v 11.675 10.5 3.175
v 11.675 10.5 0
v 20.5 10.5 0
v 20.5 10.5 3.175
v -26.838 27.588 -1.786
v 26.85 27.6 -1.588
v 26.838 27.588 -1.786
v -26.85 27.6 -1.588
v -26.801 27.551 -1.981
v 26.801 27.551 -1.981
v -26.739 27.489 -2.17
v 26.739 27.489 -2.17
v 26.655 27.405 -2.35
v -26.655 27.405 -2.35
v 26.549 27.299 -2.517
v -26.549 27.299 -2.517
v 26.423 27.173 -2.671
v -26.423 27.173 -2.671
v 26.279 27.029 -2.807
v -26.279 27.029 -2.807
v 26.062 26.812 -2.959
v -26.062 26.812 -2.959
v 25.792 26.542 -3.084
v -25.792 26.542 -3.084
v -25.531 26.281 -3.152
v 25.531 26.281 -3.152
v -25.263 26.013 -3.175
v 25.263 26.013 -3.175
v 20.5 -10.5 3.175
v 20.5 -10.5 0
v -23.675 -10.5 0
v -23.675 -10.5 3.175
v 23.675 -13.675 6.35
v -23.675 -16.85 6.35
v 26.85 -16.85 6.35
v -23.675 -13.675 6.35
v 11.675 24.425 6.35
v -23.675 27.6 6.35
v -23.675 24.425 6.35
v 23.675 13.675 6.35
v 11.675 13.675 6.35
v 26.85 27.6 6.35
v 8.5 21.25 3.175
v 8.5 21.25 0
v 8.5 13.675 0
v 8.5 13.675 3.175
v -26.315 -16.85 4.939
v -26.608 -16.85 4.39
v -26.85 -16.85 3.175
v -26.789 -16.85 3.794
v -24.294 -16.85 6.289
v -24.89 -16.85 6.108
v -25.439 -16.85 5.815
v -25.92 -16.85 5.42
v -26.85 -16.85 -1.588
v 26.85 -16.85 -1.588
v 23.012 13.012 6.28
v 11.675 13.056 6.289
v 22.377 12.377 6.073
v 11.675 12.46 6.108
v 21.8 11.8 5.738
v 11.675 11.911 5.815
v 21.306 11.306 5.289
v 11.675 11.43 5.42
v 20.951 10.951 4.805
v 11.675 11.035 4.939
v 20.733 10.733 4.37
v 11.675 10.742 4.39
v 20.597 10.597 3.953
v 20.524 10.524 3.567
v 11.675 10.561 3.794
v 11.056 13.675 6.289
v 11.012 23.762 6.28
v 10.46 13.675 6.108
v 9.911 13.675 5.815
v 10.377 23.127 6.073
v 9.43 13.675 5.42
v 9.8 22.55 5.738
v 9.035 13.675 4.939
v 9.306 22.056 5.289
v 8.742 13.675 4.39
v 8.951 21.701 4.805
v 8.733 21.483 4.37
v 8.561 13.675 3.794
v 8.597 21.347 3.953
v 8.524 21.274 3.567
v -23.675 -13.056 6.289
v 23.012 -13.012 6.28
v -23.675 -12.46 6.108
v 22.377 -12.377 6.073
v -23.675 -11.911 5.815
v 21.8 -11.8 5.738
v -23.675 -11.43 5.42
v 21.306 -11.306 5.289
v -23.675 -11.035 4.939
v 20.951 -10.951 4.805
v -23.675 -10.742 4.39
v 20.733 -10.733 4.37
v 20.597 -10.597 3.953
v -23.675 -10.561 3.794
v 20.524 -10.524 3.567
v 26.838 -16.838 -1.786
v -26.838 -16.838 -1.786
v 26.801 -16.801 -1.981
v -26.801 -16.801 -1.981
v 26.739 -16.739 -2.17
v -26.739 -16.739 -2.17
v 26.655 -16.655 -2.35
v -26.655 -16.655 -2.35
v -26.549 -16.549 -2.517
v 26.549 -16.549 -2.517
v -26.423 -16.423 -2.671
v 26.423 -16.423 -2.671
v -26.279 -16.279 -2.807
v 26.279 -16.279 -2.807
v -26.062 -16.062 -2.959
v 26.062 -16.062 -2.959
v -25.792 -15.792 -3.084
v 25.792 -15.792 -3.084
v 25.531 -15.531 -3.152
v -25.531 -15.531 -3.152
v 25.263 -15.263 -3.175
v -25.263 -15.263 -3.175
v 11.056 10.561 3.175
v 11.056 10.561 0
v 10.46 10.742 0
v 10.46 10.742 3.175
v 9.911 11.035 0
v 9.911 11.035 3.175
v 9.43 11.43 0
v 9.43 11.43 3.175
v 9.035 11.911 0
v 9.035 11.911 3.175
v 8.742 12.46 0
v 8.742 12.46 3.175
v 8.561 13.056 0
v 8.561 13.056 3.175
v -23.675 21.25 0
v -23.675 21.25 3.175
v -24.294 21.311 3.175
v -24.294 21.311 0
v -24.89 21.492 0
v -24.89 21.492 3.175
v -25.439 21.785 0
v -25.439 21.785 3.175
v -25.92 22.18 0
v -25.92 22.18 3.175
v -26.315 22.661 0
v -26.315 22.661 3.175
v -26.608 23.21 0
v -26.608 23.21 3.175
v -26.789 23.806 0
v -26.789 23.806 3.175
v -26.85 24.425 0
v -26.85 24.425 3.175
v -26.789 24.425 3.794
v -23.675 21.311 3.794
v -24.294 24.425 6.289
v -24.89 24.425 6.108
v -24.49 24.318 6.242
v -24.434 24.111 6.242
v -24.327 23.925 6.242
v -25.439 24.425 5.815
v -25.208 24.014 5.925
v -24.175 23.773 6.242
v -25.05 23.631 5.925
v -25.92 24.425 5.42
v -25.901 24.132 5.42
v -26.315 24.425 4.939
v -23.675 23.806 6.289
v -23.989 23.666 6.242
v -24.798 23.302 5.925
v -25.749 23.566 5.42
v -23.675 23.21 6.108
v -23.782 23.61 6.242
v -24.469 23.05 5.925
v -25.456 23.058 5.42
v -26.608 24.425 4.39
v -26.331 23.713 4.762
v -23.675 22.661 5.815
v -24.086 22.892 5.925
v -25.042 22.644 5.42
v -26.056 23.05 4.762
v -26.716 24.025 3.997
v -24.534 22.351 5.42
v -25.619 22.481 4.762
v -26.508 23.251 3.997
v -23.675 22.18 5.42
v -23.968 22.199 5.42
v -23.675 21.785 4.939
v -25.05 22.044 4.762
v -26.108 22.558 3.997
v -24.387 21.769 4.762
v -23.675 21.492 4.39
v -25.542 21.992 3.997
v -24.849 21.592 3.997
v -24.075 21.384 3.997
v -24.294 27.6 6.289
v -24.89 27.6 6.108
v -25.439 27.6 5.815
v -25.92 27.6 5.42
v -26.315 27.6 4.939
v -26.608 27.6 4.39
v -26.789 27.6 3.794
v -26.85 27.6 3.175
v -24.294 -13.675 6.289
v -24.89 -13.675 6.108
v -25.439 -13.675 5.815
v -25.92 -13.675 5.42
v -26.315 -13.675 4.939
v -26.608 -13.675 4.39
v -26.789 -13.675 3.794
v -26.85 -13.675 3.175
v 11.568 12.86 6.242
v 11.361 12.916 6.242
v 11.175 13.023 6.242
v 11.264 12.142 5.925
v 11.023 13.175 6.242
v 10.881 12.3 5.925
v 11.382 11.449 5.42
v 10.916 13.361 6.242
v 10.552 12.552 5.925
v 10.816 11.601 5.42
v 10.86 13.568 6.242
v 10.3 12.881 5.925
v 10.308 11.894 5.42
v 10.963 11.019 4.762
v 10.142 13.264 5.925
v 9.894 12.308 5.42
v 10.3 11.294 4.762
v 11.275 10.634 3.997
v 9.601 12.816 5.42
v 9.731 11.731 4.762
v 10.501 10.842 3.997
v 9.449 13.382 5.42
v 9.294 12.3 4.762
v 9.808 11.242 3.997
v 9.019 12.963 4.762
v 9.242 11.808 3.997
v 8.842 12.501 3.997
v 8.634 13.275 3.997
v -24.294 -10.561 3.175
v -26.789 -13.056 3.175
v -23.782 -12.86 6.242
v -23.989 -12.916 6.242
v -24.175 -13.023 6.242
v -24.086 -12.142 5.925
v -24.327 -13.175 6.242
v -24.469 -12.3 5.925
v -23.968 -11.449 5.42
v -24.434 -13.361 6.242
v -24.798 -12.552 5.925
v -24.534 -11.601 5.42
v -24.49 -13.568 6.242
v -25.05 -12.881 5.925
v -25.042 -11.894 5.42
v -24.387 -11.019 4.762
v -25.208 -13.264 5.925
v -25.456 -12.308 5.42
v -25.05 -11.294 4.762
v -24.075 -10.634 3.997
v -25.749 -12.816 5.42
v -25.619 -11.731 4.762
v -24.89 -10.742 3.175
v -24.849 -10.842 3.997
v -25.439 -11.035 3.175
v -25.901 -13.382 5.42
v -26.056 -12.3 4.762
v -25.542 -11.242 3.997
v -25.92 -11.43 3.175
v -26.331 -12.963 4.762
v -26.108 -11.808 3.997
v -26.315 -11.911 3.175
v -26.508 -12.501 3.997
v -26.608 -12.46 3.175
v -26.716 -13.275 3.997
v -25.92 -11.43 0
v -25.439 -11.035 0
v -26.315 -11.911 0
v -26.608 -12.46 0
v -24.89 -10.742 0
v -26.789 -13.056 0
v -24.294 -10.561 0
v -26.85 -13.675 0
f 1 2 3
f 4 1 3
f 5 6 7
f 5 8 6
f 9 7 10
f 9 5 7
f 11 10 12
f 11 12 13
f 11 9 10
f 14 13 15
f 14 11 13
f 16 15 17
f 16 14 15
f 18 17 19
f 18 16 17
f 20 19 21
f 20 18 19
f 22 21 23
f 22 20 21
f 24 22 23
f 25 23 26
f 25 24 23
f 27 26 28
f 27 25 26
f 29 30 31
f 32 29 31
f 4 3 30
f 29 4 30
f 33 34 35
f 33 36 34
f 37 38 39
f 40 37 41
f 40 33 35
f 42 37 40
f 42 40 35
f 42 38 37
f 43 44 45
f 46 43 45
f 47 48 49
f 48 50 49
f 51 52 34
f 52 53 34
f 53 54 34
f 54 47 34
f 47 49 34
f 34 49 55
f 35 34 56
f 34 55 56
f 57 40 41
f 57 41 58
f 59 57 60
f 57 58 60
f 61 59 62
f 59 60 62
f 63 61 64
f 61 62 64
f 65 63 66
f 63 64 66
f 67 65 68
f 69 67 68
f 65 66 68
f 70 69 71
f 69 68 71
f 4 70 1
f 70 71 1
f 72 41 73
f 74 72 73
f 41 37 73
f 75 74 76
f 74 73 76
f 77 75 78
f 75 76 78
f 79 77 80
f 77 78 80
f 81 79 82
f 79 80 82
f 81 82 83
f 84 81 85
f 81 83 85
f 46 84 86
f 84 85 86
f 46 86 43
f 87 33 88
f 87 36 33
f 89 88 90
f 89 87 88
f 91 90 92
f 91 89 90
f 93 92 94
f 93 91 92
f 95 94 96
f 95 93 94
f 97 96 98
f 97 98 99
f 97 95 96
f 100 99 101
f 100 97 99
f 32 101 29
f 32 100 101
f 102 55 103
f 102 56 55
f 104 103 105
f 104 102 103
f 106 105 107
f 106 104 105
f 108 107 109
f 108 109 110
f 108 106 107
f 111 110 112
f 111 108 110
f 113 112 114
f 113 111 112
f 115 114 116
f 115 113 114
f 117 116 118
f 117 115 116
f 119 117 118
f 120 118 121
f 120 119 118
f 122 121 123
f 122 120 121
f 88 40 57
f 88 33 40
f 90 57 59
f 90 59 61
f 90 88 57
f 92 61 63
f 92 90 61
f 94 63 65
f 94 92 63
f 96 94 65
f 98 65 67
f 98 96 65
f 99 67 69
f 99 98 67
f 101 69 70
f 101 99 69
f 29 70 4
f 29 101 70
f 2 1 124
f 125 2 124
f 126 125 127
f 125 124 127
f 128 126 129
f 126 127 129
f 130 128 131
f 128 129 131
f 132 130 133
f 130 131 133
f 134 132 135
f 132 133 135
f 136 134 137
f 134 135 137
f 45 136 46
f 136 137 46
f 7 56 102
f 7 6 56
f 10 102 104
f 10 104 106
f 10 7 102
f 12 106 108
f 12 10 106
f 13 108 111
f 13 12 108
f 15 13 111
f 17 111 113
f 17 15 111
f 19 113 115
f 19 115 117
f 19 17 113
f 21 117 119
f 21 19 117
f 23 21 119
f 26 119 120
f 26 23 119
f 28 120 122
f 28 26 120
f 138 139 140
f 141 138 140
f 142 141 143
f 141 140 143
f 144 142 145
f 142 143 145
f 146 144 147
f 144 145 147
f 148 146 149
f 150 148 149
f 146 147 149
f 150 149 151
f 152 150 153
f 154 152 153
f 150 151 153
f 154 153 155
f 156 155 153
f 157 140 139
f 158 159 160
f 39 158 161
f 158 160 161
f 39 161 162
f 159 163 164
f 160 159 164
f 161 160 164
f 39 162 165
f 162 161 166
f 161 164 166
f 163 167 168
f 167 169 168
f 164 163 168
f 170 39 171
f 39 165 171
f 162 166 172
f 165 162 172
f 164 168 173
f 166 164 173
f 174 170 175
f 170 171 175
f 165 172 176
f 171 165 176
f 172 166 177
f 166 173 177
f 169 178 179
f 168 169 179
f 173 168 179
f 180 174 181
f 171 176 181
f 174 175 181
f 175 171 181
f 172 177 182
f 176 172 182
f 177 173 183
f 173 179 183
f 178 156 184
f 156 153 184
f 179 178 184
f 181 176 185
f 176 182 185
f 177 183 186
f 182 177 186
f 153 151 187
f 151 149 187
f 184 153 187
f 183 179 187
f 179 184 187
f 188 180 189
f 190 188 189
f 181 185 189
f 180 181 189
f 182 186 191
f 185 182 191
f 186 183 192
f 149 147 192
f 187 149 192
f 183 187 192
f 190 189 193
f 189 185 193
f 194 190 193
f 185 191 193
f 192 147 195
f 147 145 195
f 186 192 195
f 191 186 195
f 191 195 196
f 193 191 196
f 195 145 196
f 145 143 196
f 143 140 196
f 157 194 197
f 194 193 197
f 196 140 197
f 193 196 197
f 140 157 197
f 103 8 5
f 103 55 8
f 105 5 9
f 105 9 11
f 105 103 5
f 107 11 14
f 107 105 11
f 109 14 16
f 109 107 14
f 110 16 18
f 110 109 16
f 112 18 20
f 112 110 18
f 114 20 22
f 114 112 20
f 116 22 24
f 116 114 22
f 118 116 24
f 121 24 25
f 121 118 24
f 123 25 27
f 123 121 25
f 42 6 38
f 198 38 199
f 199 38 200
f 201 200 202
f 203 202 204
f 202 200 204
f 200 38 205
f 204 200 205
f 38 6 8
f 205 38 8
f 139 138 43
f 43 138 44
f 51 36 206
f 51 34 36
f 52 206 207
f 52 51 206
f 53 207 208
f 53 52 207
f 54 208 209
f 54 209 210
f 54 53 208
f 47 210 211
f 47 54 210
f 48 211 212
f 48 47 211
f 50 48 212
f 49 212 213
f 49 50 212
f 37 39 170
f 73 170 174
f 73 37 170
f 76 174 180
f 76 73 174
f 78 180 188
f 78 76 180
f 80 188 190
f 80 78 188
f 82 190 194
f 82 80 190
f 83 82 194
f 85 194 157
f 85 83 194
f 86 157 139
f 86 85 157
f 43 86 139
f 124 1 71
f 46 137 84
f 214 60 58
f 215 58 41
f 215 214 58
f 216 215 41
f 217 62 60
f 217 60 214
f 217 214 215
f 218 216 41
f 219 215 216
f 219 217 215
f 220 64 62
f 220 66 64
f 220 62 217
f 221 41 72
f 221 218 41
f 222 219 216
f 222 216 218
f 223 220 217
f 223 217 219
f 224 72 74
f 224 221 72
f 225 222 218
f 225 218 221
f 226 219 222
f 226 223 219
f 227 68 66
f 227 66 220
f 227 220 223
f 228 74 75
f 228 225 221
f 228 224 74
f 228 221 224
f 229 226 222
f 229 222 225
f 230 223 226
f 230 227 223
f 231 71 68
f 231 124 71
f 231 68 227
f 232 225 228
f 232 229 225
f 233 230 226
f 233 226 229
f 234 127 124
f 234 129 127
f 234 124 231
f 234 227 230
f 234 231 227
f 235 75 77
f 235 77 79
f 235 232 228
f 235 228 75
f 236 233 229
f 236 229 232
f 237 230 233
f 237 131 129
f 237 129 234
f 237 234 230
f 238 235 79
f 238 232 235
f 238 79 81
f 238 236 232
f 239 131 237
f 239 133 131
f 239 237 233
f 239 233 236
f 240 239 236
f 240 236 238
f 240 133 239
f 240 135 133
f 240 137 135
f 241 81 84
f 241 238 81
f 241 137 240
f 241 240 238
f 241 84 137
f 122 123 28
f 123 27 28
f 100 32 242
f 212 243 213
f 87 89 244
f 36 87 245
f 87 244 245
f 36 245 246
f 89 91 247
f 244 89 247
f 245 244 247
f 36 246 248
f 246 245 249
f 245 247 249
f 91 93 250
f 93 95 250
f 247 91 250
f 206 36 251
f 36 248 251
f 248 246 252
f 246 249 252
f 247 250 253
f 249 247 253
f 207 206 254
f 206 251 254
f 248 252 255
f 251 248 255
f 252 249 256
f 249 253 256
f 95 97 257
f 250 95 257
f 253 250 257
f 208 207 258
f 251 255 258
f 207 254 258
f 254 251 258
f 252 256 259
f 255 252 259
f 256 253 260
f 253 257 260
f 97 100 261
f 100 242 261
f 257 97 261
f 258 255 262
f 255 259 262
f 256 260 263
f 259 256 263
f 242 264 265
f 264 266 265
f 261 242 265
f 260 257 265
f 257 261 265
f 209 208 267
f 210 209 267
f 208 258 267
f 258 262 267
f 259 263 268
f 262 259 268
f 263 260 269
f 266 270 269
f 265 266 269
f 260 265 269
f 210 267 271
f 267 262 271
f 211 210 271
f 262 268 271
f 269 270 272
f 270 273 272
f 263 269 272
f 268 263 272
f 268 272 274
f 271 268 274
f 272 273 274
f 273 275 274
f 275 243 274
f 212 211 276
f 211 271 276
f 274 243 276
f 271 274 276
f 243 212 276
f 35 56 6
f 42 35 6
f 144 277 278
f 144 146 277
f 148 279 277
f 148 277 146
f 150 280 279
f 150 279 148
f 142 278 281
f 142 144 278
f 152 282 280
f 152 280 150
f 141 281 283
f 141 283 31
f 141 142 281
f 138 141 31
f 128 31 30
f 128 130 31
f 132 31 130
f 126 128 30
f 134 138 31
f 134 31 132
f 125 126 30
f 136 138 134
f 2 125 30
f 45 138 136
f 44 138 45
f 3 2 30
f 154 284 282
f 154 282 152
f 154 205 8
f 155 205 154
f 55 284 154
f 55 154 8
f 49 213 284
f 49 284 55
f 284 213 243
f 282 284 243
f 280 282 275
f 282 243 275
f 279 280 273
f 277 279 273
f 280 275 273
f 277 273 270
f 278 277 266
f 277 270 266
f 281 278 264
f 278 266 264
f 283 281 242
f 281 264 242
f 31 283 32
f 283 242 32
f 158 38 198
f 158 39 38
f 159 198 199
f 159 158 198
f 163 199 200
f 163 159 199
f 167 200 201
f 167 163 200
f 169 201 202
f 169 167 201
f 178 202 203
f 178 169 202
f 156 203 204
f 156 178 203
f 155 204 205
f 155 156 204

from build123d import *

# Parameters (mm, degrees)
F1_DEPTH = 3.175
F2_DEPTH = 6.35
F3_R     = 3.175
F4_R     = 3.175
F5_R     = 1.5875


with BuildPart() as f1:
    # F0 (on Top) → F1 (new body)
    with BuildSketch(Plane.XY):
        Polygon((8.5, 10.5), (20.5, 10.5), (20.5, -10.5), (-20.5, -10.5), (-26.85, -10.5), (-26.85, -16.85), (26.85, -16.85), (26.85, 27.6), (-26.85, 27.6), (-26.85, 21.25), (-20.5, 21.25), (8.5, 21.25), align=None)
        Polygon((20.5, -10.5), (20.5, 10.5), (8.5, 10.5), (8.5, 21.25), (-20.5, 21.25), (-20.5, 10.5), (-20.5, -10.5), align=None)
        Polygon((-26.85, -10.5), (-20.5, -10.5), (-20.5, 10.5), (-20.5, 21.25), (-26.85, 21.25), align=None)
    extrude(amount=-F1_DEPTH)

    # F0 (on Top) → F2 (join)
    with BuildSketch(Plane.XY):
        Polygon((8.5, 10.5), (20.5, 10.5), (20.5, -10.5), (-20.5, -10.5), (-26.85, -10.5), (-26.85, -16.85), (26.85, -16.85), (26.85, 27.6), (-26.85, 27.6), (-26.85, 21.25), (-20.5, 21.25), (8.5, 21.25), align=None)
    extrude(amount=F2_DEPTH)

    # F3
    f3_edges = [f1.edges().sort_by_distance(p)[0] for p in [
        (8.5, 10.5, 3.175),
        (-26.85, -10.5, 3.175),
        (-26.85, 21.25, 3.175),
    ]]
    fillet(f3_edges, radius=F3_R)

    # F4
    f4_edges = [f1.edges().sort_by_distance(p)[0] for p in [
        (9.429936, 11.429936, 6.35),
        (20.5, 0, 6.35),
        (-1.5875, -10.5, 6.35),
        (-7.5875, 21.25, 6.35),
    ]]
    fillet(f4_edges, radius=F4_R)

    # F5
    f5_edges = [f1.edges().sort_by_distance(p)[0] for p in [
        (0, -16.85, -3.175),
        (26.85, 5.375, -3.175),
        (0, 27.6, -3.175),
        (-26.85, 5.375, -3.175),
    ]]
    fillet(f5_edges, radius=F5_R)


solid = f1.part
